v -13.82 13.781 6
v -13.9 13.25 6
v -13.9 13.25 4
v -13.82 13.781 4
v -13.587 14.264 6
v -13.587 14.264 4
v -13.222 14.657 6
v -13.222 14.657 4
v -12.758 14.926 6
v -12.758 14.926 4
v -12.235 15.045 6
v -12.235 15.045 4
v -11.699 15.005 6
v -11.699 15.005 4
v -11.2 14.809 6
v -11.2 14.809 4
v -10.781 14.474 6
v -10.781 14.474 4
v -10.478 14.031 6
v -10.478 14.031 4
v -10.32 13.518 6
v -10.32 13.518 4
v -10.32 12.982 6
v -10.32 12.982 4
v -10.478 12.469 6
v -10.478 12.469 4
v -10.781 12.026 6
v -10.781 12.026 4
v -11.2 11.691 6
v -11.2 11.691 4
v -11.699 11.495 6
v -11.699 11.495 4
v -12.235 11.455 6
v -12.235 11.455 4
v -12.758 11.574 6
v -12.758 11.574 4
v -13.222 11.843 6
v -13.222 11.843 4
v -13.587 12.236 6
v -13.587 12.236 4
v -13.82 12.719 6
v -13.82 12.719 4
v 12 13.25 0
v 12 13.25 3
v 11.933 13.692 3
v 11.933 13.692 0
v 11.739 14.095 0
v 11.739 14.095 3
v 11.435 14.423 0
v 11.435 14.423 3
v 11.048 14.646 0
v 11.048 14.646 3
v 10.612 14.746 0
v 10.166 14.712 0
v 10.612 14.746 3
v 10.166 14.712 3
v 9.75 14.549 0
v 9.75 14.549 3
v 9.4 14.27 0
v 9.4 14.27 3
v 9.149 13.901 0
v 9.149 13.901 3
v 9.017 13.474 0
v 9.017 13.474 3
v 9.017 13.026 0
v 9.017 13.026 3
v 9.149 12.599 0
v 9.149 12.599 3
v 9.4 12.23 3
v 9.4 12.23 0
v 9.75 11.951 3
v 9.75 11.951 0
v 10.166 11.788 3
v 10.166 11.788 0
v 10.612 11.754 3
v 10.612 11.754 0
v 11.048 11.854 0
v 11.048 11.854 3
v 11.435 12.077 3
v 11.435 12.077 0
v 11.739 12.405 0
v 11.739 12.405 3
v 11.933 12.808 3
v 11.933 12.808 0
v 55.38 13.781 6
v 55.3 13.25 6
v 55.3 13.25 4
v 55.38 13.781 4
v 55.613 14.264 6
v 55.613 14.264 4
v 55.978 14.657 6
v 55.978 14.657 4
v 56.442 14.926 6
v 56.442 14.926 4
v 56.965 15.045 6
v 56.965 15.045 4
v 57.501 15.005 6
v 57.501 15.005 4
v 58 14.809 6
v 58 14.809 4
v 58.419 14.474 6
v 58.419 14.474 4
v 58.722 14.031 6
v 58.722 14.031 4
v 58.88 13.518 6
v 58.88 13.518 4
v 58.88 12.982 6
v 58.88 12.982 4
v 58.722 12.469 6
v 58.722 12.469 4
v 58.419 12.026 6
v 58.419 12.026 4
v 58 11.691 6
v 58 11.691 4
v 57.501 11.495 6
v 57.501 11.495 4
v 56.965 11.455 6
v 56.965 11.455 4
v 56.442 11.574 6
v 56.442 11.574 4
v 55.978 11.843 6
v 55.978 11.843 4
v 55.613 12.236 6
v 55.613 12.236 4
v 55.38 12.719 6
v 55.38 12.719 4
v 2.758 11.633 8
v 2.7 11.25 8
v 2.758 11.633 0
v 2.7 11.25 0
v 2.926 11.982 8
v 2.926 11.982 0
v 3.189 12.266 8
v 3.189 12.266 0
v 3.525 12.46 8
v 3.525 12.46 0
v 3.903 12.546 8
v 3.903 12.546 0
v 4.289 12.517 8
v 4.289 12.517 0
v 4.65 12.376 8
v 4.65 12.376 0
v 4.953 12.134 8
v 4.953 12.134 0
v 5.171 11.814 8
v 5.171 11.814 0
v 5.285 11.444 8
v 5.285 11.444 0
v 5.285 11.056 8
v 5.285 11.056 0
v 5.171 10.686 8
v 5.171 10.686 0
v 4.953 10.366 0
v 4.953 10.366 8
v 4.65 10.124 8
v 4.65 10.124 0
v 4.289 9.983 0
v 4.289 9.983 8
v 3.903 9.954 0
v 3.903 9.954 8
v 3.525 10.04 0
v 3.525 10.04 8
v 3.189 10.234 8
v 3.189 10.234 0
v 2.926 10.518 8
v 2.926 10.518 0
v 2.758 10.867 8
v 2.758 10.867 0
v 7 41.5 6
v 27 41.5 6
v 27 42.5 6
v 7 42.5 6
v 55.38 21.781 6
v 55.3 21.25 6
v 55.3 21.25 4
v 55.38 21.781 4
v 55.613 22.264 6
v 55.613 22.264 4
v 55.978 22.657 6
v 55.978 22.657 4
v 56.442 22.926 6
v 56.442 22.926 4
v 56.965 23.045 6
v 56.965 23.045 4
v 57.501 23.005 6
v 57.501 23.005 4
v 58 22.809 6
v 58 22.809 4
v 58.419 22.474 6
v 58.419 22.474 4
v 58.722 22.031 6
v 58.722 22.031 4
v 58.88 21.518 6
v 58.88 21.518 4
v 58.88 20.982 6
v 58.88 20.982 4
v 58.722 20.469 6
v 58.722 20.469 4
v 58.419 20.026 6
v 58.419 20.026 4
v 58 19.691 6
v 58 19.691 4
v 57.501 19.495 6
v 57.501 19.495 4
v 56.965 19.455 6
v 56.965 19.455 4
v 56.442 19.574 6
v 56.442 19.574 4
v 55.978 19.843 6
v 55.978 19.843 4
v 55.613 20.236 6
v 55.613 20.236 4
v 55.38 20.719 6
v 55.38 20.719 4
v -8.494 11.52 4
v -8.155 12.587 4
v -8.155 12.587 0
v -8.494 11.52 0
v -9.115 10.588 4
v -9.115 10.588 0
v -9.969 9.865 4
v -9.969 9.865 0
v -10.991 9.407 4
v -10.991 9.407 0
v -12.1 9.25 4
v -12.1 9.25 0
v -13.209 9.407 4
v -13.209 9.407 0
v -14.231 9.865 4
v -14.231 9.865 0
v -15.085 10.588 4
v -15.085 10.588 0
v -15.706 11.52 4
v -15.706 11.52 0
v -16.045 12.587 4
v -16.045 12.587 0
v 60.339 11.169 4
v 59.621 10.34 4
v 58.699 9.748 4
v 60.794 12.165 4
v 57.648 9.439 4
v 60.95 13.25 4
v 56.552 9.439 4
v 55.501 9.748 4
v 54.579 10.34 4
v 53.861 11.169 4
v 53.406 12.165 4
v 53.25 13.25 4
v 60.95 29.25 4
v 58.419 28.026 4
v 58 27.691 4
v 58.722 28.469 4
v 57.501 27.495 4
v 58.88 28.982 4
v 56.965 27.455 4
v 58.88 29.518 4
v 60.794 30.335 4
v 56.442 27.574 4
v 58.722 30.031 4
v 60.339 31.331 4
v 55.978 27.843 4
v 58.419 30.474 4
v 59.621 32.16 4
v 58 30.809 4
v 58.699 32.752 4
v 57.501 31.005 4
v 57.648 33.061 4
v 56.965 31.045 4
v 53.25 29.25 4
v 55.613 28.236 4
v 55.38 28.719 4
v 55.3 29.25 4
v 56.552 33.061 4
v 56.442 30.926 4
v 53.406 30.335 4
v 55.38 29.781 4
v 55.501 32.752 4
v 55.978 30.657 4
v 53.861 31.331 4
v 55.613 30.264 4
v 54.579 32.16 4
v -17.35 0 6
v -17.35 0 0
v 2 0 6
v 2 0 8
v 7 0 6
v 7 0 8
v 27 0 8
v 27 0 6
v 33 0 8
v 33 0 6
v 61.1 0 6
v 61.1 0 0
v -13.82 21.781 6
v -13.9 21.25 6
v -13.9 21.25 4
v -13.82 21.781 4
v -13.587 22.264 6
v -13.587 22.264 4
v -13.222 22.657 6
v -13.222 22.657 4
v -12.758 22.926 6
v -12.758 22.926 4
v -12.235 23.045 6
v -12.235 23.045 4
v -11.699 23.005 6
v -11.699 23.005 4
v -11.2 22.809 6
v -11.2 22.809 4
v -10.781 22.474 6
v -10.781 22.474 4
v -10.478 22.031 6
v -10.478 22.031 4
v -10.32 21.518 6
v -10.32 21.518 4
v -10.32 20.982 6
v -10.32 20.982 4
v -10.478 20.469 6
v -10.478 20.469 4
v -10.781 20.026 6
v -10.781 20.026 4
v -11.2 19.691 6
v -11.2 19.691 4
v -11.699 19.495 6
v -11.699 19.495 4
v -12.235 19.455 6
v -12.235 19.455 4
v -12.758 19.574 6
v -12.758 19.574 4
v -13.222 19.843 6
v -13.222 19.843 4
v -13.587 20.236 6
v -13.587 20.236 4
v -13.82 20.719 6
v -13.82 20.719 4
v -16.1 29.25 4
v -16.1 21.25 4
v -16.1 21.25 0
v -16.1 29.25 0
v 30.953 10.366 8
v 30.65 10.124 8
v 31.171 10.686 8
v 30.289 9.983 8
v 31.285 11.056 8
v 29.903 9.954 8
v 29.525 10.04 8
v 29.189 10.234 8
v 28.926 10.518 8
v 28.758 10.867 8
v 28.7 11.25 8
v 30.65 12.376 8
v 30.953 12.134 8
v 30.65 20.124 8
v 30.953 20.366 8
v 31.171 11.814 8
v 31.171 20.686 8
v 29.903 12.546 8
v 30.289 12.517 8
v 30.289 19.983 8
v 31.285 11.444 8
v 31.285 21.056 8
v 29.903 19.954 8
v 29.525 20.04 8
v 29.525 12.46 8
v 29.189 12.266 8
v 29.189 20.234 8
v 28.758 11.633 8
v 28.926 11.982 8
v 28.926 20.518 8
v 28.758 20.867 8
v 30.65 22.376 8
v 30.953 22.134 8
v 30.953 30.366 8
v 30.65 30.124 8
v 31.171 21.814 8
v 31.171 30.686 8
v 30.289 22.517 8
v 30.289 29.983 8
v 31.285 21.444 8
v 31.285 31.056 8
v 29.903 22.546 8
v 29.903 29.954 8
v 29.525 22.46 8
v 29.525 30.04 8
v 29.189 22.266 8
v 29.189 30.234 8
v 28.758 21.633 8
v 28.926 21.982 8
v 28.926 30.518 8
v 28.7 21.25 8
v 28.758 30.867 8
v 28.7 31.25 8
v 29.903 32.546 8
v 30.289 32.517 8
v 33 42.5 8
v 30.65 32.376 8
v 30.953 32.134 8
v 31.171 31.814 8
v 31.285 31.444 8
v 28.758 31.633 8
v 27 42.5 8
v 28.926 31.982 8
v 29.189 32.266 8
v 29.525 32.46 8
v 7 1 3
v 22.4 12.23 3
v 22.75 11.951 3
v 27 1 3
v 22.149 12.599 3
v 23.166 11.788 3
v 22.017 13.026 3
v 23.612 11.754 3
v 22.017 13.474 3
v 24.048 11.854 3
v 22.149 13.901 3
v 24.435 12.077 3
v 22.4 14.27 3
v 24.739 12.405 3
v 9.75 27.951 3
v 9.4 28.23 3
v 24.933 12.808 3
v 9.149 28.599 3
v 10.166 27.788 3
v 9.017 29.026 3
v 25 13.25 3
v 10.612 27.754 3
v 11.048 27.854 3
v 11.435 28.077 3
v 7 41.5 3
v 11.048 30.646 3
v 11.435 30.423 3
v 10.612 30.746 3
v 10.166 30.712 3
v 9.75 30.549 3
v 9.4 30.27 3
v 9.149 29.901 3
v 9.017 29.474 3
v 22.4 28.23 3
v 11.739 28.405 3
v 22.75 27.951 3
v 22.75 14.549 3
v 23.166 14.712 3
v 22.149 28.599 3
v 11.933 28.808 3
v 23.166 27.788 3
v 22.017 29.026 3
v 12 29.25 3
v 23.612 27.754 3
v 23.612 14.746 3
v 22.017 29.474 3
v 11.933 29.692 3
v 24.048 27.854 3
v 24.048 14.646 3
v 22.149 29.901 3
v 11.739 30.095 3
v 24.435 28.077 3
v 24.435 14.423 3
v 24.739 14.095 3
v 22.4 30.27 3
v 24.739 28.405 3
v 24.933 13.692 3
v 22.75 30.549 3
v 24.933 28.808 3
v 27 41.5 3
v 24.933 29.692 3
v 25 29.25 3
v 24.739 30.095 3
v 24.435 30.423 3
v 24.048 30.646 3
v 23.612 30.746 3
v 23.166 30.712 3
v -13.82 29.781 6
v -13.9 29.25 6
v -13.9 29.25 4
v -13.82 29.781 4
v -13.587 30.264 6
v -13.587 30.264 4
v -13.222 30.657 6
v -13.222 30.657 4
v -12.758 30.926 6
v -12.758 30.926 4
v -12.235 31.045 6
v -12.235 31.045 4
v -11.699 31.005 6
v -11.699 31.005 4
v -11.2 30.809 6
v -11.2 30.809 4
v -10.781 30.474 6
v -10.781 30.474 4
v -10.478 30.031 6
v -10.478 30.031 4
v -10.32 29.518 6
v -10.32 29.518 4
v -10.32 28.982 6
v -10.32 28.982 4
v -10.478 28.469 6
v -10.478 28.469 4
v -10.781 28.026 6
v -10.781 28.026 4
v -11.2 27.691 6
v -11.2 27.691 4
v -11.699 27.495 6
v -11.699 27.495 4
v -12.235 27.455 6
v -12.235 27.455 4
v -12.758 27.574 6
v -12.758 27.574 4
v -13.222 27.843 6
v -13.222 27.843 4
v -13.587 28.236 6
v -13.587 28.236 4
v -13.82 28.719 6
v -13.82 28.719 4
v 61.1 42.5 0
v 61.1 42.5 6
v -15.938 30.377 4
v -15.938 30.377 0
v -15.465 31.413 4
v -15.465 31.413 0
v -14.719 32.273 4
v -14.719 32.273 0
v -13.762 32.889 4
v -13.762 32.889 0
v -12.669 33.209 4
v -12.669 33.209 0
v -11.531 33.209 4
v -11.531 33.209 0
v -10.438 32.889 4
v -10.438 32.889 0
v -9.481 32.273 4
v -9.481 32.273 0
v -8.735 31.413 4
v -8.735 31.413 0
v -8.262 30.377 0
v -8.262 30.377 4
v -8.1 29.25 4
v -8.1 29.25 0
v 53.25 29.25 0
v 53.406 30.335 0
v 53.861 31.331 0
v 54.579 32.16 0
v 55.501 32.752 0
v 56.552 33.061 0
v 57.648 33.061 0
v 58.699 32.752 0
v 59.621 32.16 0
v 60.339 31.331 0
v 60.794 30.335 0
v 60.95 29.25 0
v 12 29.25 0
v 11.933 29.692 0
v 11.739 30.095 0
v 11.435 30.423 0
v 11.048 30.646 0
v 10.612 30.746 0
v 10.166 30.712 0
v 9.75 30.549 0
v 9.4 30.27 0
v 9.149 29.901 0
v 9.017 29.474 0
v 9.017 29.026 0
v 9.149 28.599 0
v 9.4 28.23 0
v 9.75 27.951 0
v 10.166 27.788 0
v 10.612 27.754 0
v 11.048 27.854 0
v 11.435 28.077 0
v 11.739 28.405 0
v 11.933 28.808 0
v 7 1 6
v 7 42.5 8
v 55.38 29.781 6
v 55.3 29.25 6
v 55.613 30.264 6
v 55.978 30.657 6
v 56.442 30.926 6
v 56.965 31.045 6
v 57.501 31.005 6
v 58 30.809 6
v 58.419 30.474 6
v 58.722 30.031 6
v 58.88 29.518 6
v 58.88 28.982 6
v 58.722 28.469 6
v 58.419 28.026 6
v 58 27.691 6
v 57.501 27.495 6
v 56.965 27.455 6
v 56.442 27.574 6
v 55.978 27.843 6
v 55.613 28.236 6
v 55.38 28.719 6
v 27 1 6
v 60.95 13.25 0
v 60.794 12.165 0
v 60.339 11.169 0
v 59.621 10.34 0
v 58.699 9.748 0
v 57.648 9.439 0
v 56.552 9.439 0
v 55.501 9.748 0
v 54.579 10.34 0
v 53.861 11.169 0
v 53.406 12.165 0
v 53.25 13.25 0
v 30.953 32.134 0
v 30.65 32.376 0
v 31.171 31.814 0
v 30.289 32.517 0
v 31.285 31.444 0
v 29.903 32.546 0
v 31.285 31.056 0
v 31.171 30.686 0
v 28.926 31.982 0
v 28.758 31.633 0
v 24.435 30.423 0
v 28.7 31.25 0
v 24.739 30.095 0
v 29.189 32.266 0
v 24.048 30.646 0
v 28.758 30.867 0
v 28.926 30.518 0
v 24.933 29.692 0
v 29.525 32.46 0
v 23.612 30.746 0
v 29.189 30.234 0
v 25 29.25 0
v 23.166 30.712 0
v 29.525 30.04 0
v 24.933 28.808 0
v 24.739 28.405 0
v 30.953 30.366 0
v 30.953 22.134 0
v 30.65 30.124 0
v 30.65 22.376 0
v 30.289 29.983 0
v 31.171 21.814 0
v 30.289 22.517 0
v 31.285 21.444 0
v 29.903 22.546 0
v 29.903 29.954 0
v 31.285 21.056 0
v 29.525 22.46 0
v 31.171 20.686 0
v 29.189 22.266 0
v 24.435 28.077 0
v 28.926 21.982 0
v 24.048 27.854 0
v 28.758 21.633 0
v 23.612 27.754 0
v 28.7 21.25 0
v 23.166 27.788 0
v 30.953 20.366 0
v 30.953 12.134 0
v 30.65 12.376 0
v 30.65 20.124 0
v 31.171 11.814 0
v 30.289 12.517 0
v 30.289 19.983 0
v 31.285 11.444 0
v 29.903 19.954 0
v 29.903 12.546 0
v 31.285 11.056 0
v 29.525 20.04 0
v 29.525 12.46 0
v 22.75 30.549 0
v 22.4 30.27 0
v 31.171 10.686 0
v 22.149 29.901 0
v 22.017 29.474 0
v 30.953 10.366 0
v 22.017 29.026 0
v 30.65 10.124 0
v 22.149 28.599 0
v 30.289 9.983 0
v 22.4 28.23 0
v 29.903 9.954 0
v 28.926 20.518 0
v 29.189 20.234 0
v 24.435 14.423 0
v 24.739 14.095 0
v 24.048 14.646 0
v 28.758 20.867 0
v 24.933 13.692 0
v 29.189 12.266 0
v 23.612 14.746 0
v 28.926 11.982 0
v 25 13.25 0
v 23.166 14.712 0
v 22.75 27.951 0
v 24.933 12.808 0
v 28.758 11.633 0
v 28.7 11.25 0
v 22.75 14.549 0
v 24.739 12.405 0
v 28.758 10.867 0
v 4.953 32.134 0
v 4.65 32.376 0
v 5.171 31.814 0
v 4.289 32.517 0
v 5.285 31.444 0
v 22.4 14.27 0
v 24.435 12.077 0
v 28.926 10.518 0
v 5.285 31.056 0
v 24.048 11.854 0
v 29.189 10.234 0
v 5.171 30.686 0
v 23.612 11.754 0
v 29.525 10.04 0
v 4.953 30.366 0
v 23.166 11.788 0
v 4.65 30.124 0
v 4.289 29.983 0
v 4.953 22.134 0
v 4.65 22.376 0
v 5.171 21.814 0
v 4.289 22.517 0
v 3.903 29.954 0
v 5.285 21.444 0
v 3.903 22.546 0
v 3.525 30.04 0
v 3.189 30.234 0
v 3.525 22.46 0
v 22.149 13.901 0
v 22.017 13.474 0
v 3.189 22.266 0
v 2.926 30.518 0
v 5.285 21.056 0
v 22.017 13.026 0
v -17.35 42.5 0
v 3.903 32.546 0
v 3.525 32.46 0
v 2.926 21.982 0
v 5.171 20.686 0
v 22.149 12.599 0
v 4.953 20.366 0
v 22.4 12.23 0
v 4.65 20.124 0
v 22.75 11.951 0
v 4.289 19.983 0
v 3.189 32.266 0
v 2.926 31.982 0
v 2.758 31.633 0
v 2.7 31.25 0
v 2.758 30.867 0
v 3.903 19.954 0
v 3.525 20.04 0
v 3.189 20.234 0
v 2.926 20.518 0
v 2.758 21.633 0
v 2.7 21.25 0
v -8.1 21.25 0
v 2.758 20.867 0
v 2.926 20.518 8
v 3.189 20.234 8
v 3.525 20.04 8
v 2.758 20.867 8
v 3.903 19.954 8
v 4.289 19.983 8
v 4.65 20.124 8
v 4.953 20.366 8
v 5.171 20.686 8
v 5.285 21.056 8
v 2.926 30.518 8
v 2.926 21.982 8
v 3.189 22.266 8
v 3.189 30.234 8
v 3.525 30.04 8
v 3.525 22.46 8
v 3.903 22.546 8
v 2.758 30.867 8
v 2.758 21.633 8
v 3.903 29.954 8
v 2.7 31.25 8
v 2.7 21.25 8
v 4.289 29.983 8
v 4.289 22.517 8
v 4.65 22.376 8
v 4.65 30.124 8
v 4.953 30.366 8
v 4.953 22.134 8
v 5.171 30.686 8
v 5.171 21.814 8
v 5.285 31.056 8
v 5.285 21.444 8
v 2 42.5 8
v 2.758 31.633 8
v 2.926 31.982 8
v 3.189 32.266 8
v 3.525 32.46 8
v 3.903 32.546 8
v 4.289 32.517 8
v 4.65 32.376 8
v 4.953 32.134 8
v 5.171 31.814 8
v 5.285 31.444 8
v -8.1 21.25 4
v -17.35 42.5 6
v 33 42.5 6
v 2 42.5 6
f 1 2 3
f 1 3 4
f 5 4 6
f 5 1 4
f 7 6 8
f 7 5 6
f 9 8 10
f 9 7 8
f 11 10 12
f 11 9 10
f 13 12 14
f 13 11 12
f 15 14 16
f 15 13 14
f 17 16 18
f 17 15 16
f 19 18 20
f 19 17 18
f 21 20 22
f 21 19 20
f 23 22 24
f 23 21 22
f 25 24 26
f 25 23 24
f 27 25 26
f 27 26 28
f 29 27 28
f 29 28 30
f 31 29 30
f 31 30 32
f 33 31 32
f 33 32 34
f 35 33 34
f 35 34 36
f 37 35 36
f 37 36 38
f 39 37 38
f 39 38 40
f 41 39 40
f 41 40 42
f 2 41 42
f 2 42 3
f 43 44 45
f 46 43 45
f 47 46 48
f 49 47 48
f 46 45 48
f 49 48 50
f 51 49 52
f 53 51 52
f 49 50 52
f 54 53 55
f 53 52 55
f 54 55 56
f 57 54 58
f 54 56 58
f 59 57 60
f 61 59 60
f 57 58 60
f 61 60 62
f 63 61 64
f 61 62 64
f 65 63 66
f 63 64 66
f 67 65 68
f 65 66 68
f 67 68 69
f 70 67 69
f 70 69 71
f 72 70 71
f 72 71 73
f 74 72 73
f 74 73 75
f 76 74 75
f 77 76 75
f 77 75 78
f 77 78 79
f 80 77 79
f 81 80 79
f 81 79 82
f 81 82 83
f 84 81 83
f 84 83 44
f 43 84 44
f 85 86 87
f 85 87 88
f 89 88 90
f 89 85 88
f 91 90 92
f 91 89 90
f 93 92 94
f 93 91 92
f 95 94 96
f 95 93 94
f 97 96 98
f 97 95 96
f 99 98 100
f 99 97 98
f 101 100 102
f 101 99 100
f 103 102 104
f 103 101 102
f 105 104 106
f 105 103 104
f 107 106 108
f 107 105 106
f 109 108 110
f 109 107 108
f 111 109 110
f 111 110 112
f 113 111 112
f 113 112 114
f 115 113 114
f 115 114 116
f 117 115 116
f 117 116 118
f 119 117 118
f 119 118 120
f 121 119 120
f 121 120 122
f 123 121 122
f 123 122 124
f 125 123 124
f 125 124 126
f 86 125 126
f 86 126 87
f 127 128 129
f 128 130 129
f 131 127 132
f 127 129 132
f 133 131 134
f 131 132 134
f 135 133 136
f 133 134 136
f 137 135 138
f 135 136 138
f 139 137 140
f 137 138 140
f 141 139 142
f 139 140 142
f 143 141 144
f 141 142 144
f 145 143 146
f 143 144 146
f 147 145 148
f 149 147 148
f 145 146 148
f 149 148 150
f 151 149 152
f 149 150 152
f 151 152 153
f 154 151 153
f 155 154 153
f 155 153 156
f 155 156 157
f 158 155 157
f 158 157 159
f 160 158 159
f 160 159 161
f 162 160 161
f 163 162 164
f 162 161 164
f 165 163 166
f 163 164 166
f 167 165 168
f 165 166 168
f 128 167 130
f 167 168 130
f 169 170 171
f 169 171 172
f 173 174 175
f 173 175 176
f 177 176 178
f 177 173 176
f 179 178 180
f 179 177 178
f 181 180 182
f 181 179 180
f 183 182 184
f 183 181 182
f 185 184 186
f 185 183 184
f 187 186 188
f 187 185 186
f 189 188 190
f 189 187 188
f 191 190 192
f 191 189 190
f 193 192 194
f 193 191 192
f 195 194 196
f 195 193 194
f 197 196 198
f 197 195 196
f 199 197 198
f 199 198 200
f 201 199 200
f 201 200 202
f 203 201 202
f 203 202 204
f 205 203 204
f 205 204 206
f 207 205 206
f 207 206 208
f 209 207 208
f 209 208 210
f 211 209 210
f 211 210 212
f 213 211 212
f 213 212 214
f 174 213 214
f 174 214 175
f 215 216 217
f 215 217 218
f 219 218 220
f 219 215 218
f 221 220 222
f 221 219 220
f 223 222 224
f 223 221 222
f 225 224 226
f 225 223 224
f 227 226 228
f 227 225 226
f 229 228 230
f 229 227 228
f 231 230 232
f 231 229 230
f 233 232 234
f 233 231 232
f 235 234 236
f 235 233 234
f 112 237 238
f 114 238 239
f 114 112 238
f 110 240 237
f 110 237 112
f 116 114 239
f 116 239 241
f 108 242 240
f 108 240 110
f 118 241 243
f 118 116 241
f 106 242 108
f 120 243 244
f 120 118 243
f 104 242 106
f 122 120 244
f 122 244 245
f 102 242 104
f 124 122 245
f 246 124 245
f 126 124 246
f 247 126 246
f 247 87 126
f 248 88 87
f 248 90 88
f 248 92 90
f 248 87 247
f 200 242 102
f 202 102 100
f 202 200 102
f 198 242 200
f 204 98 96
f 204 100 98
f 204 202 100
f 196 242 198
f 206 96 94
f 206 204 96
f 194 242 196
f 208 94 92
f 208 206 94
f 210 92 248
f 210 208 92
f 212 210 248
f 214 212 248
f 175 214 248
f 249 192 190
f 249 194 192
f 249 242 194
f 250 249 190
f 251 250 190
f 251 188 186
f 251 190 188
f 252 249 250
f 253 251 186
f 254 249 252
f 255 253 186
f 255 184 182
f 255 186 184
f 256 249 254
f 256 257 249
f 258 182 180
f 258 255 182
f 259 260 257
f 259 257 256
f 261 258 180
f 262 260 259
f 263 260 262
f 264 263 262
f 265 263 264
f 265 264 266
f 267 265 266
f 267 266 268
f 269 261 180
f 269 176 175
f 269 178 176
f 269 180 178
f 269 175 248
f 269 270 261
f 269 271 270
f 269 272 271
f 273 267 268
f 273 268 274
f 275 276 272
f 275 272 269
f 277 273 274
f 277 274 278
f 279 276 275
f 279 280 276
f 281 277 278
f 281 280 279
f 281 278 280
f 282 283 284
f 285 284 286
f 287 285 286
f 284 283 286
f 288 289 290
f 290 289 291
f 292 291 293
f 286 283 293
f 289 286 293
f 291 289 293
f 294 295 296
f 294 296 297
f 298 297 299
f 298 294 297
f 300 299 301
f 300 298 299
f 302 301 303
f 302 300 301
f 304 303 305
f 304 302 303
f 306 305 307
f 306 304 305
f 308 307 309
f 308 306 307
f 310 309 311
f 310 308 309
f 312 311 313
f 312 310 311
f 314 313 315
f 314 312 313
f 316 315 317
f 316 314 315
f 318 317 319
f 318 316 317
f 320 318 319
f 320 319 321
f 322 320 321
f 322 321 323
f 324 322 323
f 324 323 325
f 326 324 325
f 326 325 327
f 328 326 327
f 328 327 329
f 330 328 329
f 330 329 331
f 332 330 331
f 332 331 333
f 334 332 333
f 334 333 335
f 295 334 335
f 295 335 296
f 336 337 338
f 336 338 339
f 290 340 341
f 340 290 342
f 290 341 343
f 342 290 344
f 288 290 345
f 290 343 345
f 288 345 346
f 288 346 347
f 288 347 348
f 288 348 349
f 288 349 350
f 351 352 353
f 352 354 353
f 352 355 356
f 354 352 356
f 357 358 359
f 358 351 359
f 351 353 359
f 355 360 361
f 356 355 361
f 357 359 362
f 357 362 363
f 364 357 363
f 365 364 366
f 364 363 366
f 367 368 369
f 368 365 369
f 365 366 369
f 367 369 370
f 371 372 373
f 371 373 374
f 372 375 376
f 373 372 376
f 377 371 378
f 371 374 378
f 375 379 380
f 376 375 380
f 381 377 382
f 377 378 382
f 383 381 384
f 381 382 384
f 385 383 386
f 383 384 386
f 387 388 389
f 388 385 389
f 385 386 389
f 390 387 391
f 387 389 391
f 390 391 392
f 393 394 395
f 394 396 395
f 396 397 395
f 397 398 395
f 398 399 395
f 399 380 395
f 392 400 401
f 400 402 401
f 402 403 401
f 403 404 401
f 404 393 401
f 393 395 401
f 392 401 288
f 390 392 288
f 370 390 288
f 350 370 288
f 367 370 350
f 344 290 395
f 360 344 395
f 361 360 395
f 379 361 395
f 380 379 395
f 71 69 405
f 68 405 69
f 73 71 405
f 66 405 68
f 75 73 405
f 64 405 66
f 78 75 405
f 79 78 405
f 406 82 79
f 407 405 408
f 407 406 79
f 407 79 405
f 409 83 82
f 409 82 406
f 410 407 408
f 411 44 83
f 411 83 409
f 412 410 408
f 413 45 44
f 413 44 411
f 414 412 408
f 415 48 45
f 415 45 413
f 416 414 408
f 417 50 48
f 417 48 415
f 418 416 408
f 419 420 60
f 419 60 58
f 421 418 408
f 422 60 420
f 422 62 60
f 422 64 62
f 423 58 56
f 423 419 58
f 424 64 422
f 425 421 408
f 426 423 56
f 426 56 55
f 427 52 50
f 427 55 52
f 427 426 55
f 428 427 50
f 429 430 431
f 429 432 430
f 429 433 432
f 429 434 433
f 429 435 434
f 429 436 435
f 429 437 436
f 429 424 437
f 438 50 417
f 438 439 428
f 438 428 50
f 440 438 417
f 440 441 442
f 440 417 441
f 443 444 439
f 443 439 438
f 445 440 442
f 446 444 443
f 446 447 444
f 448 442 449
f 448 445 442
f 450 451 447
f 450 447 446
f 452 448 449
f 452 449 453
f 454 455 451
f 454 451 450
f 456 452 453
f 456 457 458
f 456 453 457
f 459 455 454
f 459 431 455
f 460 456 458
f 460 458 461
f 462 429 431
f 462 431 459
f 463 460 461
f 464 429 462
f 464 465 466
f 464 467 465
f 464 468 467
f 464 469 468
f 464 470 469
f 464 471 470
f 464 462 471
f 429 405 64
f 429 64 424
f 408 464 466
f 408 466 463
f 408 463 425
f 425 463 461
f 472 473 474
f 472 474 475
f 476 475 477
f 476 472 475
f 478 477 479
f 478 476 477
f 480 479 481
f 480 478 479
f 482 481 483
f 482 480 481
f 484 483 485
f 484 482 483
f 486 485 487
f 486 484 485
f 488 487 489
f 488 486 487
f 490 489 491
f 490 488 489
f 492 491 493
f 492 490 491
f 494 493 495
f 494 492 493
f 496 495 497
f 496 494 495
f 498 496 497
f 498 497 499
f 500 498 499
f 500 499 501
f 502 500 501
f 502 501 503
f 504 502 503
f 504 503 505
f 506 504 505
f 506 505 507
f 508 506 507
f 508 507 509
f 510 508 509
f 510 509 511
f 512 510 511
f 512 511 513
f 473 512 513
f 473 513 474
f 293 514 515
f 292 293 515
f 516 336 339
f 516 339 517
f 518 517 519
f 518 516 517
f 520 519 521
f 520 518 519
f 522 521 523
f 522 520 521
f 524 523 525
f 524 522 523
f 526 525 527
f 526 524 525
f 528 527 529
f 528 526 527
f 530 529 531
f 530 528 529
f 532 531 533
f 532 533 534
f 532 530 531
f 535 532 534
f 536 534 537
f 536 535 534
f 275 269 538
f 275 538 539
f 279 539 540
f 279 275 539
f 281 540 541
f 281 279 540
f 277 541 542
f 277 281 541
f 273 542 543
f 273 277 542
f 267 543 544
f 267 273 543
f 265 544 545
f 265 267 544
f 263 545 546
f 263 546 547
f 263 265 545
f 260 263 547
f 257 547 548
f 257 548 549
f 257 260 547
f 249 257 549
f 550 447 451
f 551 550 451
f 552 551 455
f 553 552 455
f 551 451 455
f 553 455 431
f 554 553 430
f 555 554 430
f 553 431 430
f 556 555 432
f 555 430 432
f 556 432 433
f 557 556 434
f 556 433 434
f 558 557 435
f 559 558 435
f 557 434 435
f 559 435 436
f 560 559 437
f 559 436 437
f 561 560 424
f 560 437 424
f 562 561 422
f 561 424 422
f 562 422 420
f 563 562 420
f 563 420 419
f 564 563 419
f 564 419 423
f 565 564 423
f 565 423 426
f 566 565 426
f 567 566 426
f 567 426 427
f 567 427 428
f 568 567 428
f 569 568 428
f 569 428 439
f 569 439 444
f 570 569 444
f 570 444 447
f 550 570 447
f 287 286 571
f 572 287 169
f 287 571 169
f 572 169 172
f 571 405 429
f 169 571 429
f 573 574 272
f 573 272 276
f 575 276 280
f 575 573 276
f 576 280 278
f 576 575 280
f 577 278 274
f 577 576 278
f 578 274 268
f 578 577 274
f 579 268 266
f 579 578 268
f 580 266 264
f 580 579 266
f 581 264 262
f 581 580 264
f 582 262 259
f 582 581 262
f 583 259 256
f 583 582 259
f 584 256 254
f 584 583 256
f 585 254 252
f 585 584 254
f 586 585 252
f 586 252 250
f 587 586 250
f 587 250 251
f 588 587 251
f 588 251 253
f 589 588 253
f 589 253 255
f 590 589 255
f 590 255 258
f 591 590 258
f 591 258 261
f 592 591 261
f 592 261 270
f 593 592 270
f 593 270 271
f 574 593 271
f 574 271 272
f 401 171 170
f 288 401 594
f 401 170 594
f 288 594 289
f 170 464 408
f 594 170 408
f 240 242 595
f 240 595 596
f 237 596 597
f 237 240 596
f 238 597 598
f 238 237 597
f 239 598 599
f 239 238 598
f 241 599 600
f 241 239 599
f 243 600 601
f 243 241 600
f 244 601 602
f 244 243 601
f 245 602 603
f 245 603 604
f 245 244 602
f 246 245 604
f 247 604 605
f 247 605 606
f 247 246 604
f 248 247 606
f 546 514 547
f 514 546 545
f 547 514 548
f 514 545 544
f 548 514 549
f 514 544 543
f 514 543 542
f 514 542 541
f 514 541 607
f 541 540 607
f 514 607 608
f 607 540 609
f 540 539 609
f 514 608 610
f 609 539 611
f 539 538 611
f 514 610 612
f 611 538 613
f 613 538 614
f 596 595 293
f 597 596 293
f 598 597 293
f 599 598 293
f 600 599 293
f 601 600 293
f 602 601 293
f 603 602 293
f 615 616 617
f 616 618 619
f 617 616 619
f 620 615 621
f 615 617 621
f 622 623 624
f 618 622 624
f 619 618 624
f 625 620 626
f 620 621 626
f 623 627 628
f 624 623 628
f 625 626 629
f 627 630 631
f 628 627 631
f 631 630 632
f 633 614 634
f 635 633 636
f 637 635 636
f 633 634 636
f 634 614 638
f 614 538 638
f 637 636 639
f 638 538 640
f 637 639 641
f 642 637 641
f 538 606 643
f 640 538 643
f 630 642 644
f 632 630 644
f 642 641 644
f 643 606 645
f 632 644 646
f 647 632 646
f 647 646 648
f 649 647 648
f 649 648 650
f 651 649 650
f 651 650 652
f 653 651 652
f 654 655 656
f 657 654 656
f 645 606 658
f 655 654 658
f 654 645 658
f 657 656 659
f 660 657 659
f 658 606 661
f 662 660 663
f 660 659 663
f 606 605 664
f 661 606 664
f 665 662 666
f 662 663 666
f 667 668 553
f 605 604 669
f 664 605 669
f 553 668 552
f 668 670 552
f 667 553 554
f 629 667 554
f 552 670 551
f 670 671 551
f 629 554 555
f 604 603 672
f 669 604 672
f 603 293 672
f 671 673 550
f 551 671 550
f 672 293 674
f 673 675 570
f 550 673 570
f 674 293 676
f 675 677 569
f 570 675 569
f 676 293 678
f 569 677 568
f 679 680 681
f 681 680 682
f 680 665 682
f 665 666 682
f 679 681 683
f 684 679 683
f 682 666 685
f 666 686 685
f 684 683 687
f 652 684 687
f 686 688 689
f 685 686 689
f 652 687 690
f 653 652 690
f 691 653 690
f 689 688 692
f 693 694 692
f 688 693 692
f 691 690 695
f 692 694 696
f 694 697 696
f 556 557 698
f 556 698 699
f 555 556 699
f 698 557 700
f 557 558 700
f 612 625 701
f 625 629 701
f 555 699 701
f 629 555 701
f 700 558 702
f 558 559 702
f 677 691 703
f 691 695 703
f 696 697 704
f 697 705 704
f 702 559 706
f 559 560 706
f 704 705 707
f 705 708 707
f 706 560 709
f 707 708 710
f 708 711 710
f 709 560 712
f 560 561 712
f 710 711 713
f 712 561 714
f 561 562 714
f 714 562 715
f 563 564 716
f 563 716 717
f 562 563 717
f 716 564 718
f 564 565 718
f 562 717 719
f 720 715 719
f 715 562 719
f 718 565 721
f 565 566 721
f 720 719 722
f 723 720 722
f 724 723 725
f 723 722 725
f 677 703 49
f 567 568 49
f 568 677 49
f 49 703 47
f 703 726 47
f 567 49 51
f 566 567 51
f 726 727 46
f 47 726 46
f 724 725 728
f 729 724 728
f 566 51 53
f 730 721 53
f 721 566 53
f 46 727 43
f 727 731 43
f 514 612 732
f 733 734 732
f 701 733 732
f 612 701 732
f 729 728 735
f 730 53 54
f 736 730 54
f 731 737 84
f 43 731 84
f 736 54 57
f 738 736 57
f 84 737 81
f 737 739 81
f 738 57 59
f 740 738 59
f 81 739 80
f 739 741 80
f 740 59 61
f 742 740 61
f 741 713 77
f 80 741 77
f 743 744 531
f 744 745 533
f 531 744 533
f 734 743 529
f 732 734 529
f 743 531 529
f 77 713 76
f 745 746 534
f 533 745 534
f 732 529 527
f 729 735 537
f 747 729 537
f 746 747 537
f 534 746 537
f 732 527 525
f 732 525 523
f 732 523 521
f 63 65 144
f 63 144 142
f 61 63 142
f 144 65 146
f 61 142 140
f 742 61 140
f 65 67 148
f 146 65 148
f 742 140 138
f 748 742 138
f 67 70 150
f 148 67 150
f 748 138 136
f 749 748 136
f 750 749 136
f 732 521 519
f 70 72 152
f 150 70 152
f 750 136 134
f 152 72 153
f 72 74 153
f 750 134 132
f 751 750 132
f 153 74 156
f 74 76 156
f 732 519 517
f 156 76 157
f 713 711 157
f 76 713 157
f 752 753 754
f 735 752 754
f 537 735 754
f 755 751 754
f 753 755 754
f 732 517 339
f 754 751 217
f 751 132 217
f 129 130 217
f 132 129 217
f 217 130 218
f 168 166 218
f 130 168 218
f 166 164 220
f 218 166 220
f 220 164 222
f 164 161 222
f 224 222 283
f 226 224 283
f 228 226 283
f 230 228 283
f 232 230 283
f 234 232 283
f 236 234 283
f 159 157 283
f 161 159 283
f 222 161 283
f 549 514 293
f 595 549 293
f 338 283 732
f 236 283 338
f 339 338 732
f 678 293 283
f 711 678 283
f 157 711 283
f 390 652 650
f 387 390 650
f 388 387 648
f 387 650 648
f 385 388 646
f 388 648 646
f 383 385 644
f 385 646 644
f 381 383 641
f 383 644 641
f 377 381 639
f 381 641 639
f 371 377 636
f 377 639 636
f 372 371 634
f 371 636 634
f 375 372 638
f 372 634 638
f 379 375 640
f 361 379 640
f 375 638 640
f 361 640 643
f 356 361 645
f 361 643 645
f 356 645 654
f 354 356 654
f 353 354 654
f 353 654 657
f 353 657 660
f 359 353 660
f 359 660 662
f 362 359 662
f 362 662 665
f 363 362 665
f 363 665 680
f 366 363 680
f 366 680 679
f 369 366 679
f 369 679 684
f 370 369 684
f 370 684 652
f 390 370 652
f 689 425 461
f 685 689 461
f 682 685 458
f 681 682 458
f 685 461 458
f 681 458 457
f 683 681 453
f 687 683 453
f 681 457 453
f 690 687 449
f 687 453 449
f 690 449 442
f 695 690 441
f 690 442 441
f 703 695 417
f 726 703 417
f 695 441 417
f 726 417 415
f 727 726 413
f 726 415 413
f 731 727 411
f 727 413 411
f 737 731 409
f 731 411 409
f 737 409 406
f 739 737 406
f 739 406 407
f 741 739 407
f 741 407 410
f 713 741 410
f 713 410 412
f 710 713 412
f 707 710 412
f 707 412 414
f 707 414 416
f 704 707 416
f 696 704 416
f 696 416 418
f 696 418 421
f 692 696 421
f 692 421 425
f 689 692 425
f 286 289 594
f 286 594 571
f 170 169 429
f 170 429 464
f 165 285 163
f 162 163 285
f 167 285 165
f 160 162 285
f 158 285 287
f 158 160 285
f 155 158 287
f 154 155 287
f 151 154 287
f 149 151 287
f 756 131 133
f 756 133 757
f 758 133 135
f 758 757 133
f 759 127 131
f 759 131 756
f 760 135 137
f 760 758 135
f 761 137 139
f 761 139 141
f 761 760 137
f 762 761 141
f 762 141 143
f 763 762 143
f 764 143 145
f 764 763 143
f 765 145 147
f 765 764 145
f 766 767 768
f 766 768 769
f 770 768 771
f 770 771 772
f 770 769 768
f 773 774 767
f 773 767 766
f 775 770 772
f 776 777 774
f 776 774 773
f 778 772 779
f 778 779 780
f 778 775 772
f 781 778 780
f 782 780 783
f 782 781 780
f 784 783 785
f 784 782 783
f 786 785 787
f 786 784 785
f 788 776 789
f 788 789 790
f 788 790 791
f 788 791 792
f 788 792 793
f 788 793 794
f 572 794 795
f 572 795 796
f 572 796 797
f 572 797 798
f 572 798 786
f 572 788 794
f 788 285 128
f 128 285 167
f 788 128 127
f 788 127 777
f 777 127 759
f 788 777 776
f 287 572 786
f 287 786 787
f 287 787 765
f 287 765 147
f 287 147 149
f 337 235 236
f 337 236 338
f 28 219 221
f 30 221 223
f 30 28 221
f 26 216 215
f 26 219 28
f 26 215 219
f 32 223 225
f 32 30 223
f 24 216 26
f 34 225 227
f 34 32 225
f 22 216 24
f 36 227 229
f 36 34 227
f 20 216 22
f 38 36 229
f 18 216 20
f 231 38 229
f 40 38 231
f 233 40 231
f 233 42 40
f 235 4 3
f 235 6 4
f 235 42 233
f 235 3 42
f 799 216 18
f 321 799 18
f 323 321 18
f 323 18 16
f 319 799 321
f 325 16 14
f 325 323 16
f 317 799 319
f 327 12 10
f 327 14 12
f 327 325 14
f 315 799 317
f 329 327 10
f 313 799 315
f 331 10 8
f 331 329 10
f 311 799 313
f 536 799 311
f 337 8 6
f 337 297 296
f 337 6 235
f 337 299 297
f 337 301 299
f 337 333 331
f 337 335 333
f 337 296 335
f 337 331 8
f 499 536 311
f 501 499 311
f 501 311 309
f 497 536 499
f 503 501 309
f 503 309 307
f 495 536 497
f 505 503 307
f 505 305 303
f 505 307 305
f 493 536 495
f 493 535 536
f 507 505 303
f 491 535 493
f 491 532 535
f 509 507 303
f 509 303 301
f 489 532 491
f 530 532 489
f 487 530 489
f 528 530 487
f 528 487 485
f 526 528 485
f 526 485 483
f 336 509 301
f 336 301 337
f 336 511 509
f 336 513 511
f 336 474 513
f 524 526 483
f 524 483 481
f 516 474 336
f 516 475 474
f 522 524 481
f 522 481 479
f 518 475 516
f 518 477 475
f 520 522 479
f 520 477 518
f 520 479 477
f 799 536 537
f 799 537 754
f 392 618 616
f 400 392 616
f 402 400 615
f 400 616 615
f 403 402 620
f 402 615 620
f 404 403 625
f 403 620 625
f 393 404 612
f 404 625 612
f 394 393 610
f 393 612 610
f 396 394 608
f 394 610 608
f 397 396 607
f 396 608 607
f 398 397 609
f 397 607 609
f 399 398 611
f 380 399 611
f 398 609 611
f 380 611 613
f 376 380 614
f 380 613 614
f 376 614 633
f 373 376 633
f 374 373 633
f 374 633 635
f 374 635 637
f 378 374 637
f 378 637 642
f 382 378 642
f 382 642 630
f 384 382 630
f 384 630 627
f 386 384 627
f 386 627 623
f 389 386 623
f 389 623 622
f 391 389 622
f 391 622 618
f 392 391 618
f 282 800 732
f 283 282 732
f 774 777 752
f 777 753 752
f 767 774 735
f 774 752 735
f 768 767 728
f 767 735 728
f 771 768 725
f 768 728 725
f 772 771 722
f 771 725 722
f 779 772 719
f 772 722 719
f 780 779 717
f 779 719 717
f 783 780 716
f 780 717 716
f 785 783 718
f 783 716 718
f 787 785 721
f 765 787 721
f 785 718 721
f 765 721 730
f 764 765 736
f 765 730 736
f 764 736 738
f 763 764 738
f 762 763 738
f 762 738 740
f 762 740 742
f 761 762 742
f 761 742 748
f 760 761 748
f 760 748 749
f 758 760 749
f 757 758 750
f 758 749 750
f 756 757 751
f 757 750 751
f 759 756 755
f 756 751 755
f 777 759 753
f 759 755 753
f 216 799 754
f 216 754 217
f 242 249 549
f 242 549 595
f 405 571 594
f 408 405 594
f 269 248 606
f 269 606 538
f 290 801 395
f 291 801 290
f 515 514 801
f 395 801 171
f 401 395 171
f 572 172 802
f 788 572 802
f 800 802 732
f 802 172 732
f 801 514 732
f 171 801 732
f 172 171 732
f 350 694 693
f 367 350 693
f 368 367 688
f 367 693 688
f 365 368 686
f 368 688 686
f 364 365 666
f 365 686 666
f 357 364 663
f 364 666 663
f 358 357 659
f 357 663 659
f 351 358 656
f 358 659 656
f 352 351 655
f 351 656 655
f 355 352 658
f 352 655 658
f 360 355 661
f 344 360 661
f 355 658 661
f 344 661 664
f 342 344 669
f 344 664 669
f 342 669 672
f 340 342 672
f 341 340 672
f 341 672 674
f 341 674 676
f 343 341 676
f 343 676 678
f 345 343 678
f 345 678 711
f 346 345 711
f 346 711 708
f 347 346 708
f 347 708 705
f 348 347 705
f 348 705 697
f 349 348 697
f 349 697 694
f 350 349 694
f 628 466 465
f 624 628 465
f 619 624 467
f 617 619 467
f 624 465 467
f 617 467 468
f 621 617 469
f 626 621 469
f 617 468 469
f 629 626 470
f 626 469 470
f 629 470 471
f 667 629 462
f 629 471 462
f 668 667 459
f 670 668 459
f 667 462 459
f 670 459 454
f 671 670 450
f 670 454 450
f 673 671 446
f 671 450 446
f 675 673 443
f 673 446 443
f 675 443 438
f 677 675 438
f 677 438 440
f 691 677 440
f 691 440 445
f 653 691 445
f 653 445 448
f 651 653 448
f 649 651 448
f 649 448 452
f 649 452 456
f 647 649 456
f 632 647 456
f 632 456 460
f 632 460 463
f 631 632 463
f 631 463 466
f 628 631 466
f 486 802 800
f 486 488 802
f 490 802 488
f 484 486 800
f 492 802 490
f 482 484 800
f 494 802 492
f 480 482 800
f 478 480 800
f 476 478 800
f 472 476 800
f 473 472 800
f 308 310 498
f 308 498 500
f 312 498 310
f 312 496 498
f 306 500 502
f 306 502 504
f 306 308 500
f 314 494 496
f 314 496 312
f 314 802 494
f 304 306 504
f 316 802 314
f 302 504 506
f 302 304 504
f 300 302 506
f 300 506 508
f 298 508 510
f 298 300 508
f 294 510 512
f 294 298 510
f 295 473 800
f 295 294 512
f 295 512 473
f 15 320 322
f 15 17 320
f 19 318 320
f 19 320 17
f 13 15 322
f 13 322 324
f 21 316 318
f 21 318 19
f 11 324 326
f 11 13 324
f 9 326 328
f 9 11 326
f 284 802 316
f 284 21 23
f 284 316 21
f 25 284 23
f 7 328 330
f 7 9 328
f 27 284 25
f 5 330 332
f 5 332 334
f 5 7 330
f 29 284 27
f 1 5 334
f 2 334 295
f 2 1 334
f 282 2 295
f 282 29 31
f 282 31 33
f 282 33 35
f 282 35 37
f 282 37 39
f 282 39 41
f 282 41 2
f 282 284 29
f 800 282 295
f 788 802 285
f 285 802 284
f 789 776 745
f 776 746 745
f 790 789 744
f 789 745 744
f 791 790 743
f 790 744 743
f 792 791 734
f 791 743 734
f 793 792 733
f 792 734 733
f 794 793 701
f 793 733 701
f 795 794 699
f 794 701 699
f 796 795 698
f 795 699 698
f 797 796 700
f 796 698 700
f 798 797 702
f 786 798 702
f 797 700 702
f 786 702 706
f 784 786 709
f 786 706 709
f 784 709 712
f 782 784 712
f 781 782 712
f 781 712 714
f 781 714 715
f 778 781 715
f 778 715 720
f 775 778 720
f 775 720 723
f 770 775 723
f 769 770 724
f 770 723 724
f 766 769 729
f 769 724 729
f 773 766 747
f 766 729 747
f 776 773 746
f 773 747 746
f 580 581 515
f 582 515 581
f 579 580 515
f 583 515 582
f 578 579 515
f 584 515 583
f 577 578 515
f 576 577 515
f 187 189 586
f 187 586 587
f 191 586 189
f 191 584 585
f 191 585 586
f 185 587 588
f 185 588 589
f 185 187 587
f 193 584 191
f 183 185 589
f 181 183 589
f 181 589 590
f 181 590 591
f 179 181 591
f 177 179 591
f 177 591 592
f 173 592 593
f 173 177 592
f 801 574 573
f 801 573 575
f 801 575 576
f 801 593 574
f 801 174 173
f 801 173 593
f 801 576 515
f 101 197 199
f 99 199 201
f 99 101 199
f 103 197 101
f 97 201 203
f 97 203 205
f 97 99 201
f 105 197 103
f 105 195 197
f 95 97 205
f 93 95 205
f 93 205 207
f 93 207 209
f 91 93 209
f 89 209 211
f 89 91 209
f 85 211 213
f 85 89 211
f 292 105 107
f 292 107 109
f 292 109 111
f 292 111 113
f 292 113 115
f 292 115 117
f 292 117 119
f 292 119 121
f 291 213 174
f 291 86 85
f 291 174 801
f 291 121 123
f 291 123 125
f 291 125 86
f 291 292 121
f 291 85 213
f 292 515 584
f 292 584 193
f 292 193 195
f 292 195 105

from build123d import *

# Parameters (mm, degrees)
EXTRUDE_1_DEPTH         = 42.5
SKETCH_2_W              = 20
SKETCH_2_H              = 40.5
CUT_EXTRUDE_2_DEPTH     = 3
SKETCH_4_R              = 1.5
CUT_EXTRUDE_4_DEPTH     = 4
CUT_EXTRUDE_START       = -6
SKETCH_5_R              = 1.8
CUT_EXTRUDE_5_DEPTH     = 6
SKETCH_6_R              = 1.8
CUT_EXTRUDE_6_DEPTH     = 6
CUT_EXTRUDE_START_2     = -4
CUT_EXTRUDE_9_OUTLINE_R = 1.8
CUT_EXTRUDE_9_DEPTH     = 4
SKETCH_8_R              = 1.3
CUT_EXTRUDE_10_DEPTH    = 16
EXTRUDE_2_DEPTH         = 2
SKETCH_10_R             = 1.3
CUT_EXTRUDE_11_DEPTH    = 16


# Read off the part's stored shape, not the designer's step: 除料-伸長9
with BuildPart() as part:
    # 草圖1 → 填料-伸長1 (new body)
    with BuildSketch(Plane(origin=(0, 0, 0), x_dir=(1, 0, 0), z_dir=(0, 1, 0))):
        Polygon((36, 0), (61.1, 0), (61.1, -6), (-17.35, -6), (-17.35, 0), (0, 0), align=None)
    extrude(amount=EXTRUDE_1_DEPTH)

    # 草圖2 → 除料-伸長2 (cut)
    with BuildSketch(Plane.XY.offset(6)):
        with Locations((17, 21.25)):
            Rectangle(SKETCH_2_W, SKETCH_2_H)
    extrude(amount=-CUT_EXTRUDE_2_DEPTH, mode=Mode.SUBTRACT)

    # 草圖4 → 除料-伸長4 (cut)
    with BuildSketch(Plane.XY.offset(3)):
        with Locations((23.5, 29.25)):
            Circle(SKETCH_4_R)
        with Locations((10.5, 29.25)):
            Circle(SKETCH_4_R)
        with Locations((10.5, 13.25)):
            Circle(SKETCH_4_R)
        with Locations((23.5, 13.25)):
            Circle(SKETCH_4_R)
    extrude(amount=-CUT_EXTRUDE_4_DEPTH, mode=Mode.SUBTRACT)

    # 草圖5 → 除料-伸長5 (cut)
    with BuildSketch(Plane(origin=(0, 0, 0), x_dir=(-1, 0, 0), z_dir=(0, 0, -1)).offset(CUT_EXTRUDE_START)):
        with Locations((12.1, 29.25)):
            Circle(SKETCH_5_R)
        with Locations((12.1, 21.25)):
            Circle(SKETCH_5_R)
        with Locations((12.1, 13.25)):
            Circle(SKETCH_5_R)
    extrude(amount=CUT_EXTRUDE_5_DEPTH, mode=Mode.SUBTRACT)

    # 草圖6 → 除料-伸長6 (cut)
    with BuildSketch(Plane(origin=(0, 0, 0), x_dir=(-1, 0, 0), z_dir=(0, 0, -1)).offset(CUT_EXTRUDE_START)):
        with Locations((-57.1, 29.25)):
            Circle(SKETCH_6_R)
        with Locations((-57.1, 21.25)):
            Circle(SKETCH_6_R)
        with Locations((-57.1, 13.25)):
            Circle(SKETCH_6_R)
    extrude(amount=CUT_EXTRUDE_6_DEPTH, mode=Mode.SUBTRACT)

    # 除料-伸長9 outline → 除料-伸長9 (cut)
    # profile 1 of 2: a face of its own
    with BuildSketch(Plane(origin=(0, 0, 0), x_dir=(-1, 0, 0), z_dir=(0, 0, -1)).offset(CUT_EXTRUDE_START_2)):
        with BuildLine():
            Line((-60.95, 29.25), (-60.95, 13.25))
            ThreePointArc((-60.95, 13.25), (-57.1, 9.4), (-53.25, 13.25))
            Line((-53.25, 13.25), (-53.25, 29.25))
            ThreePointArc((-53.25, 29.25), (-57.1, 33.1), (-60.95, 29.25))
        make_face()
        with Locations((-57.1, 13.25)):
            Circle(CUT_EXTRUDE_9_OUTLINE_R, mode=Mode.SUBTRACT)
        with Locations((-57.1, 21.25)):
            Circle(CUT_EXTRUDE_9_OUTLINE_R, mode=Mode.SUBTRACT)
        with Locations((-57.1, 29.25)):
            Circle(CUT_EXTRUDE_9_OUTLINE_R, mode=Mode.SUBTRACT)
    # profile 2 of 2: a face of its own
    with BuildSketch(Plane(origin=(0, 0, 0), x_dir=(-1, 0, 0), z_dir=(0, 0, -1)).offset(CUT_EXTRUDE_START_2)):
        with BuildLine():
            Line((8.1, 21.25), (8.155316246, 12.587074601))
            ThreePointArc((8.155316246, 12.587074601), (12.1, 9.25), (16.044683754, 12.587074601))
            Line((16.044683754, 12.587074601), (16.1, 21.25))
            Line((16.1, 21.25), (16.1, 29.25))
            ThreePointArc((16.1, 29.25), (12.1, 33.25), (8.1, 29.25))
            Line((8.1, 29.25), (8.1, 21.25))
        make_face()
        with Locations((12.1, 13.25)):
            Circle(CUT_EXTRUDE_9_OUTLINE_R, mode=Mode.SUBTRACT)
        with Locations((12.1, 21.25)):
            Circle(CUT_EXTRUDE_9_OUTLINE_R, mode=Mode.SUBTRACT)
        with Locations((12.1, 29.25)):
            Circle(CUT_EXTRUDE_9_OUTLINE_R, mode=Mode.SUBTRACT)
    extrude(amount=CUT_EXTRUDE_9_DEPTH, mode=Mode.SUBTRACT)

    # 草圖8 → 除料-伸長10 (cut)
    with BuildSketch(Plane(origin=(0, 0, 0), x_dir=(-1, 0, 0), z_dir=(0, 0, -1))):
        with Locations((-4, 31.25)):
            Circle(SKETCH_8_R)
        with Locations((-4, 21.25)):
            Circle(SKETCH_8_R)
        with Locations((-4, 11.25)):
            Circle(SKETCH_8_R)
        with Locations((-30, 11.25)):
            Circle(SKETCH_8_R)
        with Locations((-30, 21.25)):
            Circle(SKETCH_8_R)
        with Locations((-30, 31.25)):
            Circle(SKETCH_8_R)
    extrude(amount=-CUT_EXTRUDE_10_DEPTH, mode=Mode.SUBTRACT)

    # 草圖9 → 填料-伸長2 (add)
    with BuildSketch(Plane.XY.offset(6)):
        Polygon((7, 41.5), (7, 42.5), (2, 42.5), (2, 0), (7, 0), (7, 1), align=None)
        Polygon((27, 41.5), (27, 42.5), (33, 42.5), (33, 0), (27, 0), align=None)
    extrude(amount=EXTRUDE_2_DEPTH)

    # 草圖10 → 除料-伸長11 (cut)
    with BuildSketch(Plane(origin=(0, 0, 0), x_dir=(-1, 0, 0), z_dir=(0, 0, -1))):
        with Locations((-30, 31.25)):
            Circle(SKETCH_10_R)
        with Locations((-30, 21.25)):
            Circle(SKETCH_10_R)
        with Locations((-30, 11.25)):
            Circle(SKETCH_10_R)
        with Locations((-4, 11.25)):
            Circle(SKETCH_10_R)
        with Locations((-4, 21.25)):
            Circle(SKETCH_10_R)
        with Locations((-4, 31.25)):
            Circle(SKETCH_10_R)
    extrude(amount=-CUT_EXTRUDE_11_DEPTH, mode=Mode.SUBTRACT)


solid = part.part
